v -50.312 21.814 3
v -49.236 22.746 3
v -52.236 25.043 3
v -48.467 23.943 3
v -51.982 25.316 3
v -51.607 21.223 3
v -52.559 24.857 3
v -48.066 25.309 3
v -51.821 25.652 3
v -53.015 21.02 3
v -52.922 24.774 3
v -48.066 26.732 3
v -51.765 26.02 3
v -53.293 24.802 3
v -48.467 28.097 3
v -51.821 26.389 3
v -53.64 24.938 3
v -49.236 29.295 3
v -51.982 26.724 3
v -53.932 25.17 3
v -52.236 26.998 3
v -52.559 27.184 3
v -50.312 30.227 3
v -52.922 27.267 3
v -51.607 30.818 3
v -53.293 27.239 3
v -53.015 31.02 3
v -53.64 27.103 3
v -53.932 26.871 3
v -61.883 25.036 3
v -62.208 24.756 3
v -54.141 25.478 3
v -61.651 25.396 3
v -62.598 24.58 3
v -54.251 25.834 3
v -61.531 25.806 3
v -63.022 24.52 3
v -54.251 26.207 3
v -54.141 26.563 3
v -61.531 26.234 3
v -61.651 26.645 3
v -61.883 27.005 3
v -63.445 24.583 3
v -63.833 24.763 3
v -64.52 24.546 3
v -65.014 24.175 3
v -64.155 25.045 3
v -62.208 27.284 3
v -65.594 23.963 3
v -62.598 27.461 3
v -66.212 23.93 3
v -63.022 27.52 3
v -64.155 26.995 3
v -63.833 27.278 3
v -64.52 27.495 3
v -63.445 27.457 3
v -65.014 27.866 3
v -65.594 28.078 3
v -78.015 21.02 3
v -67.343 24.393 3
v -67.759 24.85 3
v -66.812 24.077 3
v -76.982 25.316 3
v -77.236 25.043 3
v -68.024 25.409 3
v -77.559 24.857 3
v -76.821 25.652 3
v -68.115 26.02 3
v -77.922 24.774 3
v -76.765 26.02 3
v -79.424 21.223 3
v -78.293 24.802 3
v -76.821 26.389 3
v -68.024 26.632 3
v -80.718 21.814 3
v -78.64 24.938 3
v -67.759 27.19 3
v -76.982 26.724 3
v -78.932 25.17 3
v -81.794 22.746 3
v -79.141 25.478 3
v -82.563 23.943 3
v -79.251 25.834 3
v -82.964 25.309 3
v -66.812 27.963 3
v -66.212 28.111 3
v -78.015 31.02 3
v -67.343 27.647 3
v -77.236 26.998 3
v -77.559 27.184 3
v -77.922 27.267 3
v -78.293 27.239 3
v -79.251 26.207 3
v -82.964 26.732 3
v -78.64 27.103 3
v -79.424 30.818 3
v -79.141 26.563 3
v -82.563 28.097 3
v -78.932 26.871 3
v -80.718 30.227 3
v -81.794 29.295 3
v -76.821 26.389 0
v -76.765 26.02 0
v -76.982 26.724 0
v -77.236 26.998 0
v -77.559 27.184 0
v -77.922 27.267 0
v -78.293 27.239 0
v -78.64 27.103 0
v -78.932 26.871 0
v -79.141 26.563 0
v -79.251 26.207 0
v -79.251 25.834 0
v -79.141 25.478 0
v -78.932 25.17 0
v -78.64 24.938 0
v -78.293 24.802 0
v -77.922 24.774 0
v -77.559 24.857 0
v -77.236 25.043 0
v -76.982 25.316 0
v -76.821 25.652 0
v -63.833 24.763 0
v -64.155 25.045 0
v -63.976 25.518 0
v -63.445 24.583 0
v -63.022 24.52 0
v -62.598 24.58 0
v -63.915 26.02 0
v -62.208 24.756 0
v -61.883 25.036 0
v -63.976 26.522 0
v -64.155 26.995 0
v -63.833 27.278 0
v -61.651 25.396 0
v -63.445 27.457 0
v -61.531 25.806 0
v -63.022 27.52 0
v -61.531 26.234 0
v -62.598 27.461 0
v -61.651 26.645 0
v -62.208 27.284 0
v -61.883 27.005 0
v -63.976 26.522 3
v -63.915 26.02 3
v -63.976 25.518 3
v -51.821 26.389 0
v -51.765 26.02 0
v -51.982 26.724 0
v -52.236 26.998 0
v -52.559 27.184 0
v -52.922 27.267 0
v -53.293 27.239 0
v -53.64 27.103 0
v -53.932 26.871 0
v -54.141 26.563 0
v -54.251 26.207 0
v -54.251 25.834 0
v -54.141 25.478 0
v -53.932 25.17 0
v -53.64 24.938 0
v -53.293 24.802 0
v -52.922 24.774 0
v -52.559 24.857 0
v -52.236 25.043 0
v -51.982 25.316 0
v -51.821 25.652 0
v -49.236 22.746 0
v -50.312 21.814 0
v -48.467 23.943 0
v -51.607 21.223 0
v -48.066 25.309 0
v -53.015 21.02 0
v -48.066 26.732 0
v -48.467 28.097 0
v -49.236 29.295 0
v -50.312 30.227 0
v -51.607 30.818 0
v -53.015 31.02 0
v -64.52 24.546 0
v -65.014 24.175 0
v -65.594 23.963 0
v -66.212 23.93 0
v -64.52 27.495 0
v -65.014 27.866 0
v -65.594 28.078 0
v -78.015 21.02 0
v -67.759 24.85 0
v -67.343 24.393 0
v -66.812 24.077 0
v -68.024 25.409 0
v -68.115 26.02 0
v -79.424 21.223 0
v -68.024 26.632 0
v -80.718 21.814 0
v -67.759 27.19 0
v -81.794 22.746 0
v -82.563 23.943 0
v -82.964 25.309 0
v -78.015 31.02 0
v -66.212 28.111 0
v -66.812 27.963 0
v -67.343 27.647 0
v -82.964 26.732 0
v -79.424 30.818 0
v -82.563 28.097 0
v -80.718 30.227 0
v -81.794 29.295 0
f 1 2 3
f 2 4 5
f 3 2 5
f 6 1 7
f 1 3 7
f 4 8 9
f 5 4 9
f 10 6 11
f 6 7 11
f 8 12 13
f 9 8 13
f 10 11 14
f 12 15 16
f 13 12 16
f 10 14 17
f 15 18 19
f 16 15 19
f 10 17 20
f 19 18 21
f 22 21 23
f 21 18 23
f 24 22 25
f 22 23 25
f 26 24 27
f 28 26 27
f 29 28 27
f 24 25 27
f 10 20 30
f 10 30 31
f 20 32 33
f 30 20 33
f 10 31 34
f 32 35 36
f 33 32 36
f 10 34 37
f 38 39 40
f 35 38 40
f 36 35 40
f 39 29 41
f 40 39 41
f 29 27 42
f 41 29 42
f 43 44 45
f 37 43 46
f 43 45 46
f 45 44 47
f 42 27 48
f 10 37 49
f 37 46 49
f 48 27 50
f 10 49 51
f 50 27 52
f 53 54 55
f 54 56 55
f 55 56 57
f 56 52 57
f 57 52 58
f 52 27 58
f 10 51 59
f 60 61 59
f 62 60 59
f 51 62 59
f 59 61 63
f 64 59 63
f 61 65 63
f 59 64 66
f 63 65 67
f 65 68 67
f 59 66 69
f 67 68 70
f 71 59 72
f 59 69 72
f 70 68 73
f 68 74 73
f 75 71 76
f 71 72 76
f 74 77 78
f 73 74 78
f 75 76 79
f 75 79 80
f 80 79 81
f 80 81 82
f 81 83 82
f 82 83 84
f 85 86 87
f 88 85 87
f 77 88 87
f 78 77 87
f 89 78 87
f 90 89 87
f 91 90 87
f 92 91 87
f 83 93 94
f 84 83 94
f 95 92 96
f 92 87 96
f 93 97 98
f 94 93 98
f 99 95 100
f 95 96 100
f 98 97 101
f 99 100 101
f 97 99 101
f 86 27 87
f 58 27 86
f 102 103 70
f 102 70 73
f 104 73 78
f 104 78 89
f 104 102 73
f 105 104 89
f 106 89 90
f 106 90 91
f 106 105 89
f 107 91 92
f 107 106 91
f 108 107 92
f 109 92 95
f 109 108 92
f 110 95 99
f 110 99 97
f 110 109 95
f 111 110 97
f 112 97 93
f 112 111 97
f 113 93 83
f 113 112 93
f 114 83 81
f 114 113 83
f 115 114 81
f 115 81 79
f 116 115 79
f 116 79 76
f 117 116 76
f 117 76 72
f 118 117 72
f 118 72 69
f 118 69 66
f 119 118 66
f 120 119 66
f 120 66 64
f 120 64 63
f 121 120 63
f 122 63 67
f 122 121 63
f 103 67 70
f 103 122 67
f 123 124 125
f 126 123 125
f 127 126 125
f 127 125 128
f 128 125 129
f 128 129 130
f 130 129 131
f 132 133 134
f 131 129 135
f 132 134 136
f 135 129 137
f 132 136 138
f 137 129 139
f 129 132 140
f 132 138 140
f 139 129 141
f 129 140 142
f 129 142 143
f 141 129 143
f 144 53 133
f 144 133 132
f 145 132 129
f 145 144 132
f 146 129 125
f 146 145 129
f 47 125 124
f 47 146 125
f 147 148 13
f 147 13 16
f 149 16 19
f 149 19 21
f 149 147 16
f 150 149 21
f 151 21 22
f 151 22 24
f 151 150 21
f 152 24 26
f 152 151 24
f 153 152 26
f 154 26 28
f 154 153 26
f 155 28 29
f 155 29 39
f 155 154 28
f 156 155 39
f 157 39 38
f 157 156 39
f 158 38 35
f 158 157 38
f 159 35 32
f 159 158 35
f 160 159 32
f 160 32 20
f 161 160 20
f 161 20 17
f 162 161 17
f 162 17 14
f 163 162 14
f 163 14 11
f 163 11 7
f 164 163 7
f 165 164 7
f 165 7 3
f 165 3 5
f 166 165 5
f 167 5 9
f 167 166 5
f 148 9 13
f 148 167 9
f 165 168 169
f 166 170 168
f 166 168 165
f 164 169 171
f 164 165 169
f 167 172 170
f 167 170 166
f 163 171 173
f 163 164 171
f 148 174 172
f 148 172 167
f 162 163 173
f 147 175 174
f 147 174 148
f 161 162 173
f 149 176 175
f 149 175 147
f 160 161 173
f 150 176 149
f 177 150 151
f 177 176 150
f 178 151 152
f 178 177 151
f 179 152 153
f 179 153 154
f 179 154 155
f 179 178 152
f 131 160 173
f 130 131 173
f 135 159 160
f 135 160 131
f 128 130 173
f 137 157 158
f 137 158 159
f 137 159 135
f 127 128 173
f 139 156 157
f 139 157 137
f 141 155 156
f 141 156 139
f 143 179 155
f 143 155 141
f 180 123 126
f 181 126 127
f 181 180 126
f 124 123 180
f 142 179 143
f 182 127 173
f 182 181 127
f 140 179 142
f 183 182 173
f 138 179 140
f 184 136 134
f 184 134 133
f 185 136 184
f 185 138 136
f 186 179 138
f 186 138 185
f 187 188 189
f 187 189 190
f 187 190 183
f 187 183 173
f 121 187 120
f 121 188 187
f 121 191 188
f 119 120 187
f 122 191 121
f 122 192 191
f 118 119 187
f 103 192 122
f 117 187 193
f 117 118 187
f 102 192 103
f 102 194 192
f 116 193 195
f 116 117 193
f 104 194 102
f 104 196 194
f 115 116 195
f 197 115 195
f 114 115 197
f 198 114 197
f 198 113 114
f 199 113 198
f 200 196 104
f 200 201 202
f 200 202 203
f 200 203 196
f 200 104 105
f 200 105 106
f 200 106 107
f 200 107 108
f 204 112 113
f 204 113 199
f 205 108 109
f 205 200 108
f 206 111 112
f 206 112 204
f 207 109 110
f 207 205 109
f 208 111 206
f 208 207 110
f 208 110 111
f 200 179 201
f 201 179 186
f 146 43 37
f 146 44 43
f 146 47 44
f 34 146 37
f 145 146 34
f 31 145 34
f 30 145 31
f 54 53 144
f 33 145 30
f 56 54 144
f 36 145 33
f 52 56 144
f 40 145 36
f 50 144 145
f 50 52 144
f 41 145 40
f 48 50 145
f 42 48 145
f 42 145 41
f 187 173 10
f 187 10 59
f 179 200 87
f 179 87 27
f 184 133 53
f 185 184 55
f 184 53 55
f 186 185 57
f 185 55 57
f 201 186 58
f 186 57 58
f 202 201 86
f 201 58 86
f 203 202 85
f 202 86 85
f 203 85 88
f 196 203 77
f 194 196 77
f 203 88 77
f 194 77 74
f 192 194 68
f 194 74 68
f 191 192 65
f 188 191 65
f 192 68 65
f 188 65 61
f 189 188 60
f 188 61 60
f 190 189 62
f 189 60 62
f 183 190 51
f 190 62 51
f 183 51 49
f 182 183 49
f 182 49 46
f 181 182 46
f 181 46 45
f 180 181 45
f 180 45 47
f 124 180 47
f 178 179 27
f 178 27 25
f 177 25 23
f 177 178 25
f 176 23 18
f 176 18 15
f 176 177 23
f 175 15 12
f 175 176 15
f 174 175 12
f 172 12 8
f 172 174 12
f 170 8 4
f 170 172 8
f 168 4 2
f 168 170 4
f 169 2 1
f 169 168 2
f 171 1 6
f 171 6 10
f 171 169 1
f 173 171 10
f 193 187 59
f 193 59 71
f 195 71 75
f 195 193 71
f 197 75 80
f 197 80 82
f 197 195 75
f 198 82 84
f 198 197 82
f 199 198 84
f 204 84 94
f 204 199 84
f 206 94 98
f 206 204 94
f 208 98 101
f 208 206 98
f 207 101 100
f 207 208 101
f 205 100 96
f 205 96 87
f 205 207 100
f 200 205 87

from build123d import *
from build123d.topology import SkipClean

# Parameters (mm, degrees)
SKETCH1_R           = 1.5
SKETCH1_R_2         = 1.25
BOSS_EXTRUDE1_DEPTH = 3
SKETCH5_R           = 2.1
CUT_EXTRUDE2_DEPTH  = 10
BOSS_EXTRUDE2_DEPTH = 3


with BuildPart() as part:
    # Sketch1 → Boss-Extrude1 (new body)
    with BuildSketch(Plane.XY):
        with BuildLine():
            Line((-78.015219505, 31.020337279), (-53.015219505, 31.020337279))
            ThreePointArc((-53.015219505, 31.020337279), (-48.015219505, 26.020337279), (-53.015219505, 21.020337279))
            Line((-53.015219505, 21.020337279), (-78.015219505, 21.020337279))
            ThreePointArc((-78.015219505, 21.020337279), (-83.015219505, 26.020337279), (-78.015219505, 31.020337279))
        make_face()
        with Locations((-63.015219505, 26.020337279)):
            Circle(SKETCH1_R, mode=Mode.SUBTRACT)
        with Locations((-53.015219505, 26.020337279)):
            Circle(SKETCH1_R_2, mode=Mode.SUBTRACT)
        with Locations((-78.015219505, 26.020337279)):
            Circle(SKETCH1_R_2, mode=Mode.SUBTRACT)
    extrude(amount=BOSS_EXTRUDE1_DEPTH)

    # Sketch5 → Cut-Extrude2 (cut)
    with BuildSketch(Plane.XY.offset(3)):
        with Locations((-66.015219505, 26.020337279)):
            Circle(SKETCH5_R)
    extrude(amount=-CUT_EXTRUDE2_DEPTH, mode=Mode.SUBTRACT)

    # Sketch6 → Boss-Extrude2 (add)
    with SkipClean():  # the faces are left unmerged after this step: merging them gives an invalid solid
        with BuildSketch(Plane.XY.offset(3)):
            with BuildLine():
                ThreePointArc((-64.155219505, 25.045452671), (-61.515219505, 26.020337279), (-64.155219505, 26.995221888))
                ThreePointArc((-64.155219505, 26.995221888), (-63.915219505, 26.020337279), (-64.155219505, 25.045452671))
            make_face()
        extrude(amount=-BOSS_EXTRUDE2_DEPTH)


solid = part.part
